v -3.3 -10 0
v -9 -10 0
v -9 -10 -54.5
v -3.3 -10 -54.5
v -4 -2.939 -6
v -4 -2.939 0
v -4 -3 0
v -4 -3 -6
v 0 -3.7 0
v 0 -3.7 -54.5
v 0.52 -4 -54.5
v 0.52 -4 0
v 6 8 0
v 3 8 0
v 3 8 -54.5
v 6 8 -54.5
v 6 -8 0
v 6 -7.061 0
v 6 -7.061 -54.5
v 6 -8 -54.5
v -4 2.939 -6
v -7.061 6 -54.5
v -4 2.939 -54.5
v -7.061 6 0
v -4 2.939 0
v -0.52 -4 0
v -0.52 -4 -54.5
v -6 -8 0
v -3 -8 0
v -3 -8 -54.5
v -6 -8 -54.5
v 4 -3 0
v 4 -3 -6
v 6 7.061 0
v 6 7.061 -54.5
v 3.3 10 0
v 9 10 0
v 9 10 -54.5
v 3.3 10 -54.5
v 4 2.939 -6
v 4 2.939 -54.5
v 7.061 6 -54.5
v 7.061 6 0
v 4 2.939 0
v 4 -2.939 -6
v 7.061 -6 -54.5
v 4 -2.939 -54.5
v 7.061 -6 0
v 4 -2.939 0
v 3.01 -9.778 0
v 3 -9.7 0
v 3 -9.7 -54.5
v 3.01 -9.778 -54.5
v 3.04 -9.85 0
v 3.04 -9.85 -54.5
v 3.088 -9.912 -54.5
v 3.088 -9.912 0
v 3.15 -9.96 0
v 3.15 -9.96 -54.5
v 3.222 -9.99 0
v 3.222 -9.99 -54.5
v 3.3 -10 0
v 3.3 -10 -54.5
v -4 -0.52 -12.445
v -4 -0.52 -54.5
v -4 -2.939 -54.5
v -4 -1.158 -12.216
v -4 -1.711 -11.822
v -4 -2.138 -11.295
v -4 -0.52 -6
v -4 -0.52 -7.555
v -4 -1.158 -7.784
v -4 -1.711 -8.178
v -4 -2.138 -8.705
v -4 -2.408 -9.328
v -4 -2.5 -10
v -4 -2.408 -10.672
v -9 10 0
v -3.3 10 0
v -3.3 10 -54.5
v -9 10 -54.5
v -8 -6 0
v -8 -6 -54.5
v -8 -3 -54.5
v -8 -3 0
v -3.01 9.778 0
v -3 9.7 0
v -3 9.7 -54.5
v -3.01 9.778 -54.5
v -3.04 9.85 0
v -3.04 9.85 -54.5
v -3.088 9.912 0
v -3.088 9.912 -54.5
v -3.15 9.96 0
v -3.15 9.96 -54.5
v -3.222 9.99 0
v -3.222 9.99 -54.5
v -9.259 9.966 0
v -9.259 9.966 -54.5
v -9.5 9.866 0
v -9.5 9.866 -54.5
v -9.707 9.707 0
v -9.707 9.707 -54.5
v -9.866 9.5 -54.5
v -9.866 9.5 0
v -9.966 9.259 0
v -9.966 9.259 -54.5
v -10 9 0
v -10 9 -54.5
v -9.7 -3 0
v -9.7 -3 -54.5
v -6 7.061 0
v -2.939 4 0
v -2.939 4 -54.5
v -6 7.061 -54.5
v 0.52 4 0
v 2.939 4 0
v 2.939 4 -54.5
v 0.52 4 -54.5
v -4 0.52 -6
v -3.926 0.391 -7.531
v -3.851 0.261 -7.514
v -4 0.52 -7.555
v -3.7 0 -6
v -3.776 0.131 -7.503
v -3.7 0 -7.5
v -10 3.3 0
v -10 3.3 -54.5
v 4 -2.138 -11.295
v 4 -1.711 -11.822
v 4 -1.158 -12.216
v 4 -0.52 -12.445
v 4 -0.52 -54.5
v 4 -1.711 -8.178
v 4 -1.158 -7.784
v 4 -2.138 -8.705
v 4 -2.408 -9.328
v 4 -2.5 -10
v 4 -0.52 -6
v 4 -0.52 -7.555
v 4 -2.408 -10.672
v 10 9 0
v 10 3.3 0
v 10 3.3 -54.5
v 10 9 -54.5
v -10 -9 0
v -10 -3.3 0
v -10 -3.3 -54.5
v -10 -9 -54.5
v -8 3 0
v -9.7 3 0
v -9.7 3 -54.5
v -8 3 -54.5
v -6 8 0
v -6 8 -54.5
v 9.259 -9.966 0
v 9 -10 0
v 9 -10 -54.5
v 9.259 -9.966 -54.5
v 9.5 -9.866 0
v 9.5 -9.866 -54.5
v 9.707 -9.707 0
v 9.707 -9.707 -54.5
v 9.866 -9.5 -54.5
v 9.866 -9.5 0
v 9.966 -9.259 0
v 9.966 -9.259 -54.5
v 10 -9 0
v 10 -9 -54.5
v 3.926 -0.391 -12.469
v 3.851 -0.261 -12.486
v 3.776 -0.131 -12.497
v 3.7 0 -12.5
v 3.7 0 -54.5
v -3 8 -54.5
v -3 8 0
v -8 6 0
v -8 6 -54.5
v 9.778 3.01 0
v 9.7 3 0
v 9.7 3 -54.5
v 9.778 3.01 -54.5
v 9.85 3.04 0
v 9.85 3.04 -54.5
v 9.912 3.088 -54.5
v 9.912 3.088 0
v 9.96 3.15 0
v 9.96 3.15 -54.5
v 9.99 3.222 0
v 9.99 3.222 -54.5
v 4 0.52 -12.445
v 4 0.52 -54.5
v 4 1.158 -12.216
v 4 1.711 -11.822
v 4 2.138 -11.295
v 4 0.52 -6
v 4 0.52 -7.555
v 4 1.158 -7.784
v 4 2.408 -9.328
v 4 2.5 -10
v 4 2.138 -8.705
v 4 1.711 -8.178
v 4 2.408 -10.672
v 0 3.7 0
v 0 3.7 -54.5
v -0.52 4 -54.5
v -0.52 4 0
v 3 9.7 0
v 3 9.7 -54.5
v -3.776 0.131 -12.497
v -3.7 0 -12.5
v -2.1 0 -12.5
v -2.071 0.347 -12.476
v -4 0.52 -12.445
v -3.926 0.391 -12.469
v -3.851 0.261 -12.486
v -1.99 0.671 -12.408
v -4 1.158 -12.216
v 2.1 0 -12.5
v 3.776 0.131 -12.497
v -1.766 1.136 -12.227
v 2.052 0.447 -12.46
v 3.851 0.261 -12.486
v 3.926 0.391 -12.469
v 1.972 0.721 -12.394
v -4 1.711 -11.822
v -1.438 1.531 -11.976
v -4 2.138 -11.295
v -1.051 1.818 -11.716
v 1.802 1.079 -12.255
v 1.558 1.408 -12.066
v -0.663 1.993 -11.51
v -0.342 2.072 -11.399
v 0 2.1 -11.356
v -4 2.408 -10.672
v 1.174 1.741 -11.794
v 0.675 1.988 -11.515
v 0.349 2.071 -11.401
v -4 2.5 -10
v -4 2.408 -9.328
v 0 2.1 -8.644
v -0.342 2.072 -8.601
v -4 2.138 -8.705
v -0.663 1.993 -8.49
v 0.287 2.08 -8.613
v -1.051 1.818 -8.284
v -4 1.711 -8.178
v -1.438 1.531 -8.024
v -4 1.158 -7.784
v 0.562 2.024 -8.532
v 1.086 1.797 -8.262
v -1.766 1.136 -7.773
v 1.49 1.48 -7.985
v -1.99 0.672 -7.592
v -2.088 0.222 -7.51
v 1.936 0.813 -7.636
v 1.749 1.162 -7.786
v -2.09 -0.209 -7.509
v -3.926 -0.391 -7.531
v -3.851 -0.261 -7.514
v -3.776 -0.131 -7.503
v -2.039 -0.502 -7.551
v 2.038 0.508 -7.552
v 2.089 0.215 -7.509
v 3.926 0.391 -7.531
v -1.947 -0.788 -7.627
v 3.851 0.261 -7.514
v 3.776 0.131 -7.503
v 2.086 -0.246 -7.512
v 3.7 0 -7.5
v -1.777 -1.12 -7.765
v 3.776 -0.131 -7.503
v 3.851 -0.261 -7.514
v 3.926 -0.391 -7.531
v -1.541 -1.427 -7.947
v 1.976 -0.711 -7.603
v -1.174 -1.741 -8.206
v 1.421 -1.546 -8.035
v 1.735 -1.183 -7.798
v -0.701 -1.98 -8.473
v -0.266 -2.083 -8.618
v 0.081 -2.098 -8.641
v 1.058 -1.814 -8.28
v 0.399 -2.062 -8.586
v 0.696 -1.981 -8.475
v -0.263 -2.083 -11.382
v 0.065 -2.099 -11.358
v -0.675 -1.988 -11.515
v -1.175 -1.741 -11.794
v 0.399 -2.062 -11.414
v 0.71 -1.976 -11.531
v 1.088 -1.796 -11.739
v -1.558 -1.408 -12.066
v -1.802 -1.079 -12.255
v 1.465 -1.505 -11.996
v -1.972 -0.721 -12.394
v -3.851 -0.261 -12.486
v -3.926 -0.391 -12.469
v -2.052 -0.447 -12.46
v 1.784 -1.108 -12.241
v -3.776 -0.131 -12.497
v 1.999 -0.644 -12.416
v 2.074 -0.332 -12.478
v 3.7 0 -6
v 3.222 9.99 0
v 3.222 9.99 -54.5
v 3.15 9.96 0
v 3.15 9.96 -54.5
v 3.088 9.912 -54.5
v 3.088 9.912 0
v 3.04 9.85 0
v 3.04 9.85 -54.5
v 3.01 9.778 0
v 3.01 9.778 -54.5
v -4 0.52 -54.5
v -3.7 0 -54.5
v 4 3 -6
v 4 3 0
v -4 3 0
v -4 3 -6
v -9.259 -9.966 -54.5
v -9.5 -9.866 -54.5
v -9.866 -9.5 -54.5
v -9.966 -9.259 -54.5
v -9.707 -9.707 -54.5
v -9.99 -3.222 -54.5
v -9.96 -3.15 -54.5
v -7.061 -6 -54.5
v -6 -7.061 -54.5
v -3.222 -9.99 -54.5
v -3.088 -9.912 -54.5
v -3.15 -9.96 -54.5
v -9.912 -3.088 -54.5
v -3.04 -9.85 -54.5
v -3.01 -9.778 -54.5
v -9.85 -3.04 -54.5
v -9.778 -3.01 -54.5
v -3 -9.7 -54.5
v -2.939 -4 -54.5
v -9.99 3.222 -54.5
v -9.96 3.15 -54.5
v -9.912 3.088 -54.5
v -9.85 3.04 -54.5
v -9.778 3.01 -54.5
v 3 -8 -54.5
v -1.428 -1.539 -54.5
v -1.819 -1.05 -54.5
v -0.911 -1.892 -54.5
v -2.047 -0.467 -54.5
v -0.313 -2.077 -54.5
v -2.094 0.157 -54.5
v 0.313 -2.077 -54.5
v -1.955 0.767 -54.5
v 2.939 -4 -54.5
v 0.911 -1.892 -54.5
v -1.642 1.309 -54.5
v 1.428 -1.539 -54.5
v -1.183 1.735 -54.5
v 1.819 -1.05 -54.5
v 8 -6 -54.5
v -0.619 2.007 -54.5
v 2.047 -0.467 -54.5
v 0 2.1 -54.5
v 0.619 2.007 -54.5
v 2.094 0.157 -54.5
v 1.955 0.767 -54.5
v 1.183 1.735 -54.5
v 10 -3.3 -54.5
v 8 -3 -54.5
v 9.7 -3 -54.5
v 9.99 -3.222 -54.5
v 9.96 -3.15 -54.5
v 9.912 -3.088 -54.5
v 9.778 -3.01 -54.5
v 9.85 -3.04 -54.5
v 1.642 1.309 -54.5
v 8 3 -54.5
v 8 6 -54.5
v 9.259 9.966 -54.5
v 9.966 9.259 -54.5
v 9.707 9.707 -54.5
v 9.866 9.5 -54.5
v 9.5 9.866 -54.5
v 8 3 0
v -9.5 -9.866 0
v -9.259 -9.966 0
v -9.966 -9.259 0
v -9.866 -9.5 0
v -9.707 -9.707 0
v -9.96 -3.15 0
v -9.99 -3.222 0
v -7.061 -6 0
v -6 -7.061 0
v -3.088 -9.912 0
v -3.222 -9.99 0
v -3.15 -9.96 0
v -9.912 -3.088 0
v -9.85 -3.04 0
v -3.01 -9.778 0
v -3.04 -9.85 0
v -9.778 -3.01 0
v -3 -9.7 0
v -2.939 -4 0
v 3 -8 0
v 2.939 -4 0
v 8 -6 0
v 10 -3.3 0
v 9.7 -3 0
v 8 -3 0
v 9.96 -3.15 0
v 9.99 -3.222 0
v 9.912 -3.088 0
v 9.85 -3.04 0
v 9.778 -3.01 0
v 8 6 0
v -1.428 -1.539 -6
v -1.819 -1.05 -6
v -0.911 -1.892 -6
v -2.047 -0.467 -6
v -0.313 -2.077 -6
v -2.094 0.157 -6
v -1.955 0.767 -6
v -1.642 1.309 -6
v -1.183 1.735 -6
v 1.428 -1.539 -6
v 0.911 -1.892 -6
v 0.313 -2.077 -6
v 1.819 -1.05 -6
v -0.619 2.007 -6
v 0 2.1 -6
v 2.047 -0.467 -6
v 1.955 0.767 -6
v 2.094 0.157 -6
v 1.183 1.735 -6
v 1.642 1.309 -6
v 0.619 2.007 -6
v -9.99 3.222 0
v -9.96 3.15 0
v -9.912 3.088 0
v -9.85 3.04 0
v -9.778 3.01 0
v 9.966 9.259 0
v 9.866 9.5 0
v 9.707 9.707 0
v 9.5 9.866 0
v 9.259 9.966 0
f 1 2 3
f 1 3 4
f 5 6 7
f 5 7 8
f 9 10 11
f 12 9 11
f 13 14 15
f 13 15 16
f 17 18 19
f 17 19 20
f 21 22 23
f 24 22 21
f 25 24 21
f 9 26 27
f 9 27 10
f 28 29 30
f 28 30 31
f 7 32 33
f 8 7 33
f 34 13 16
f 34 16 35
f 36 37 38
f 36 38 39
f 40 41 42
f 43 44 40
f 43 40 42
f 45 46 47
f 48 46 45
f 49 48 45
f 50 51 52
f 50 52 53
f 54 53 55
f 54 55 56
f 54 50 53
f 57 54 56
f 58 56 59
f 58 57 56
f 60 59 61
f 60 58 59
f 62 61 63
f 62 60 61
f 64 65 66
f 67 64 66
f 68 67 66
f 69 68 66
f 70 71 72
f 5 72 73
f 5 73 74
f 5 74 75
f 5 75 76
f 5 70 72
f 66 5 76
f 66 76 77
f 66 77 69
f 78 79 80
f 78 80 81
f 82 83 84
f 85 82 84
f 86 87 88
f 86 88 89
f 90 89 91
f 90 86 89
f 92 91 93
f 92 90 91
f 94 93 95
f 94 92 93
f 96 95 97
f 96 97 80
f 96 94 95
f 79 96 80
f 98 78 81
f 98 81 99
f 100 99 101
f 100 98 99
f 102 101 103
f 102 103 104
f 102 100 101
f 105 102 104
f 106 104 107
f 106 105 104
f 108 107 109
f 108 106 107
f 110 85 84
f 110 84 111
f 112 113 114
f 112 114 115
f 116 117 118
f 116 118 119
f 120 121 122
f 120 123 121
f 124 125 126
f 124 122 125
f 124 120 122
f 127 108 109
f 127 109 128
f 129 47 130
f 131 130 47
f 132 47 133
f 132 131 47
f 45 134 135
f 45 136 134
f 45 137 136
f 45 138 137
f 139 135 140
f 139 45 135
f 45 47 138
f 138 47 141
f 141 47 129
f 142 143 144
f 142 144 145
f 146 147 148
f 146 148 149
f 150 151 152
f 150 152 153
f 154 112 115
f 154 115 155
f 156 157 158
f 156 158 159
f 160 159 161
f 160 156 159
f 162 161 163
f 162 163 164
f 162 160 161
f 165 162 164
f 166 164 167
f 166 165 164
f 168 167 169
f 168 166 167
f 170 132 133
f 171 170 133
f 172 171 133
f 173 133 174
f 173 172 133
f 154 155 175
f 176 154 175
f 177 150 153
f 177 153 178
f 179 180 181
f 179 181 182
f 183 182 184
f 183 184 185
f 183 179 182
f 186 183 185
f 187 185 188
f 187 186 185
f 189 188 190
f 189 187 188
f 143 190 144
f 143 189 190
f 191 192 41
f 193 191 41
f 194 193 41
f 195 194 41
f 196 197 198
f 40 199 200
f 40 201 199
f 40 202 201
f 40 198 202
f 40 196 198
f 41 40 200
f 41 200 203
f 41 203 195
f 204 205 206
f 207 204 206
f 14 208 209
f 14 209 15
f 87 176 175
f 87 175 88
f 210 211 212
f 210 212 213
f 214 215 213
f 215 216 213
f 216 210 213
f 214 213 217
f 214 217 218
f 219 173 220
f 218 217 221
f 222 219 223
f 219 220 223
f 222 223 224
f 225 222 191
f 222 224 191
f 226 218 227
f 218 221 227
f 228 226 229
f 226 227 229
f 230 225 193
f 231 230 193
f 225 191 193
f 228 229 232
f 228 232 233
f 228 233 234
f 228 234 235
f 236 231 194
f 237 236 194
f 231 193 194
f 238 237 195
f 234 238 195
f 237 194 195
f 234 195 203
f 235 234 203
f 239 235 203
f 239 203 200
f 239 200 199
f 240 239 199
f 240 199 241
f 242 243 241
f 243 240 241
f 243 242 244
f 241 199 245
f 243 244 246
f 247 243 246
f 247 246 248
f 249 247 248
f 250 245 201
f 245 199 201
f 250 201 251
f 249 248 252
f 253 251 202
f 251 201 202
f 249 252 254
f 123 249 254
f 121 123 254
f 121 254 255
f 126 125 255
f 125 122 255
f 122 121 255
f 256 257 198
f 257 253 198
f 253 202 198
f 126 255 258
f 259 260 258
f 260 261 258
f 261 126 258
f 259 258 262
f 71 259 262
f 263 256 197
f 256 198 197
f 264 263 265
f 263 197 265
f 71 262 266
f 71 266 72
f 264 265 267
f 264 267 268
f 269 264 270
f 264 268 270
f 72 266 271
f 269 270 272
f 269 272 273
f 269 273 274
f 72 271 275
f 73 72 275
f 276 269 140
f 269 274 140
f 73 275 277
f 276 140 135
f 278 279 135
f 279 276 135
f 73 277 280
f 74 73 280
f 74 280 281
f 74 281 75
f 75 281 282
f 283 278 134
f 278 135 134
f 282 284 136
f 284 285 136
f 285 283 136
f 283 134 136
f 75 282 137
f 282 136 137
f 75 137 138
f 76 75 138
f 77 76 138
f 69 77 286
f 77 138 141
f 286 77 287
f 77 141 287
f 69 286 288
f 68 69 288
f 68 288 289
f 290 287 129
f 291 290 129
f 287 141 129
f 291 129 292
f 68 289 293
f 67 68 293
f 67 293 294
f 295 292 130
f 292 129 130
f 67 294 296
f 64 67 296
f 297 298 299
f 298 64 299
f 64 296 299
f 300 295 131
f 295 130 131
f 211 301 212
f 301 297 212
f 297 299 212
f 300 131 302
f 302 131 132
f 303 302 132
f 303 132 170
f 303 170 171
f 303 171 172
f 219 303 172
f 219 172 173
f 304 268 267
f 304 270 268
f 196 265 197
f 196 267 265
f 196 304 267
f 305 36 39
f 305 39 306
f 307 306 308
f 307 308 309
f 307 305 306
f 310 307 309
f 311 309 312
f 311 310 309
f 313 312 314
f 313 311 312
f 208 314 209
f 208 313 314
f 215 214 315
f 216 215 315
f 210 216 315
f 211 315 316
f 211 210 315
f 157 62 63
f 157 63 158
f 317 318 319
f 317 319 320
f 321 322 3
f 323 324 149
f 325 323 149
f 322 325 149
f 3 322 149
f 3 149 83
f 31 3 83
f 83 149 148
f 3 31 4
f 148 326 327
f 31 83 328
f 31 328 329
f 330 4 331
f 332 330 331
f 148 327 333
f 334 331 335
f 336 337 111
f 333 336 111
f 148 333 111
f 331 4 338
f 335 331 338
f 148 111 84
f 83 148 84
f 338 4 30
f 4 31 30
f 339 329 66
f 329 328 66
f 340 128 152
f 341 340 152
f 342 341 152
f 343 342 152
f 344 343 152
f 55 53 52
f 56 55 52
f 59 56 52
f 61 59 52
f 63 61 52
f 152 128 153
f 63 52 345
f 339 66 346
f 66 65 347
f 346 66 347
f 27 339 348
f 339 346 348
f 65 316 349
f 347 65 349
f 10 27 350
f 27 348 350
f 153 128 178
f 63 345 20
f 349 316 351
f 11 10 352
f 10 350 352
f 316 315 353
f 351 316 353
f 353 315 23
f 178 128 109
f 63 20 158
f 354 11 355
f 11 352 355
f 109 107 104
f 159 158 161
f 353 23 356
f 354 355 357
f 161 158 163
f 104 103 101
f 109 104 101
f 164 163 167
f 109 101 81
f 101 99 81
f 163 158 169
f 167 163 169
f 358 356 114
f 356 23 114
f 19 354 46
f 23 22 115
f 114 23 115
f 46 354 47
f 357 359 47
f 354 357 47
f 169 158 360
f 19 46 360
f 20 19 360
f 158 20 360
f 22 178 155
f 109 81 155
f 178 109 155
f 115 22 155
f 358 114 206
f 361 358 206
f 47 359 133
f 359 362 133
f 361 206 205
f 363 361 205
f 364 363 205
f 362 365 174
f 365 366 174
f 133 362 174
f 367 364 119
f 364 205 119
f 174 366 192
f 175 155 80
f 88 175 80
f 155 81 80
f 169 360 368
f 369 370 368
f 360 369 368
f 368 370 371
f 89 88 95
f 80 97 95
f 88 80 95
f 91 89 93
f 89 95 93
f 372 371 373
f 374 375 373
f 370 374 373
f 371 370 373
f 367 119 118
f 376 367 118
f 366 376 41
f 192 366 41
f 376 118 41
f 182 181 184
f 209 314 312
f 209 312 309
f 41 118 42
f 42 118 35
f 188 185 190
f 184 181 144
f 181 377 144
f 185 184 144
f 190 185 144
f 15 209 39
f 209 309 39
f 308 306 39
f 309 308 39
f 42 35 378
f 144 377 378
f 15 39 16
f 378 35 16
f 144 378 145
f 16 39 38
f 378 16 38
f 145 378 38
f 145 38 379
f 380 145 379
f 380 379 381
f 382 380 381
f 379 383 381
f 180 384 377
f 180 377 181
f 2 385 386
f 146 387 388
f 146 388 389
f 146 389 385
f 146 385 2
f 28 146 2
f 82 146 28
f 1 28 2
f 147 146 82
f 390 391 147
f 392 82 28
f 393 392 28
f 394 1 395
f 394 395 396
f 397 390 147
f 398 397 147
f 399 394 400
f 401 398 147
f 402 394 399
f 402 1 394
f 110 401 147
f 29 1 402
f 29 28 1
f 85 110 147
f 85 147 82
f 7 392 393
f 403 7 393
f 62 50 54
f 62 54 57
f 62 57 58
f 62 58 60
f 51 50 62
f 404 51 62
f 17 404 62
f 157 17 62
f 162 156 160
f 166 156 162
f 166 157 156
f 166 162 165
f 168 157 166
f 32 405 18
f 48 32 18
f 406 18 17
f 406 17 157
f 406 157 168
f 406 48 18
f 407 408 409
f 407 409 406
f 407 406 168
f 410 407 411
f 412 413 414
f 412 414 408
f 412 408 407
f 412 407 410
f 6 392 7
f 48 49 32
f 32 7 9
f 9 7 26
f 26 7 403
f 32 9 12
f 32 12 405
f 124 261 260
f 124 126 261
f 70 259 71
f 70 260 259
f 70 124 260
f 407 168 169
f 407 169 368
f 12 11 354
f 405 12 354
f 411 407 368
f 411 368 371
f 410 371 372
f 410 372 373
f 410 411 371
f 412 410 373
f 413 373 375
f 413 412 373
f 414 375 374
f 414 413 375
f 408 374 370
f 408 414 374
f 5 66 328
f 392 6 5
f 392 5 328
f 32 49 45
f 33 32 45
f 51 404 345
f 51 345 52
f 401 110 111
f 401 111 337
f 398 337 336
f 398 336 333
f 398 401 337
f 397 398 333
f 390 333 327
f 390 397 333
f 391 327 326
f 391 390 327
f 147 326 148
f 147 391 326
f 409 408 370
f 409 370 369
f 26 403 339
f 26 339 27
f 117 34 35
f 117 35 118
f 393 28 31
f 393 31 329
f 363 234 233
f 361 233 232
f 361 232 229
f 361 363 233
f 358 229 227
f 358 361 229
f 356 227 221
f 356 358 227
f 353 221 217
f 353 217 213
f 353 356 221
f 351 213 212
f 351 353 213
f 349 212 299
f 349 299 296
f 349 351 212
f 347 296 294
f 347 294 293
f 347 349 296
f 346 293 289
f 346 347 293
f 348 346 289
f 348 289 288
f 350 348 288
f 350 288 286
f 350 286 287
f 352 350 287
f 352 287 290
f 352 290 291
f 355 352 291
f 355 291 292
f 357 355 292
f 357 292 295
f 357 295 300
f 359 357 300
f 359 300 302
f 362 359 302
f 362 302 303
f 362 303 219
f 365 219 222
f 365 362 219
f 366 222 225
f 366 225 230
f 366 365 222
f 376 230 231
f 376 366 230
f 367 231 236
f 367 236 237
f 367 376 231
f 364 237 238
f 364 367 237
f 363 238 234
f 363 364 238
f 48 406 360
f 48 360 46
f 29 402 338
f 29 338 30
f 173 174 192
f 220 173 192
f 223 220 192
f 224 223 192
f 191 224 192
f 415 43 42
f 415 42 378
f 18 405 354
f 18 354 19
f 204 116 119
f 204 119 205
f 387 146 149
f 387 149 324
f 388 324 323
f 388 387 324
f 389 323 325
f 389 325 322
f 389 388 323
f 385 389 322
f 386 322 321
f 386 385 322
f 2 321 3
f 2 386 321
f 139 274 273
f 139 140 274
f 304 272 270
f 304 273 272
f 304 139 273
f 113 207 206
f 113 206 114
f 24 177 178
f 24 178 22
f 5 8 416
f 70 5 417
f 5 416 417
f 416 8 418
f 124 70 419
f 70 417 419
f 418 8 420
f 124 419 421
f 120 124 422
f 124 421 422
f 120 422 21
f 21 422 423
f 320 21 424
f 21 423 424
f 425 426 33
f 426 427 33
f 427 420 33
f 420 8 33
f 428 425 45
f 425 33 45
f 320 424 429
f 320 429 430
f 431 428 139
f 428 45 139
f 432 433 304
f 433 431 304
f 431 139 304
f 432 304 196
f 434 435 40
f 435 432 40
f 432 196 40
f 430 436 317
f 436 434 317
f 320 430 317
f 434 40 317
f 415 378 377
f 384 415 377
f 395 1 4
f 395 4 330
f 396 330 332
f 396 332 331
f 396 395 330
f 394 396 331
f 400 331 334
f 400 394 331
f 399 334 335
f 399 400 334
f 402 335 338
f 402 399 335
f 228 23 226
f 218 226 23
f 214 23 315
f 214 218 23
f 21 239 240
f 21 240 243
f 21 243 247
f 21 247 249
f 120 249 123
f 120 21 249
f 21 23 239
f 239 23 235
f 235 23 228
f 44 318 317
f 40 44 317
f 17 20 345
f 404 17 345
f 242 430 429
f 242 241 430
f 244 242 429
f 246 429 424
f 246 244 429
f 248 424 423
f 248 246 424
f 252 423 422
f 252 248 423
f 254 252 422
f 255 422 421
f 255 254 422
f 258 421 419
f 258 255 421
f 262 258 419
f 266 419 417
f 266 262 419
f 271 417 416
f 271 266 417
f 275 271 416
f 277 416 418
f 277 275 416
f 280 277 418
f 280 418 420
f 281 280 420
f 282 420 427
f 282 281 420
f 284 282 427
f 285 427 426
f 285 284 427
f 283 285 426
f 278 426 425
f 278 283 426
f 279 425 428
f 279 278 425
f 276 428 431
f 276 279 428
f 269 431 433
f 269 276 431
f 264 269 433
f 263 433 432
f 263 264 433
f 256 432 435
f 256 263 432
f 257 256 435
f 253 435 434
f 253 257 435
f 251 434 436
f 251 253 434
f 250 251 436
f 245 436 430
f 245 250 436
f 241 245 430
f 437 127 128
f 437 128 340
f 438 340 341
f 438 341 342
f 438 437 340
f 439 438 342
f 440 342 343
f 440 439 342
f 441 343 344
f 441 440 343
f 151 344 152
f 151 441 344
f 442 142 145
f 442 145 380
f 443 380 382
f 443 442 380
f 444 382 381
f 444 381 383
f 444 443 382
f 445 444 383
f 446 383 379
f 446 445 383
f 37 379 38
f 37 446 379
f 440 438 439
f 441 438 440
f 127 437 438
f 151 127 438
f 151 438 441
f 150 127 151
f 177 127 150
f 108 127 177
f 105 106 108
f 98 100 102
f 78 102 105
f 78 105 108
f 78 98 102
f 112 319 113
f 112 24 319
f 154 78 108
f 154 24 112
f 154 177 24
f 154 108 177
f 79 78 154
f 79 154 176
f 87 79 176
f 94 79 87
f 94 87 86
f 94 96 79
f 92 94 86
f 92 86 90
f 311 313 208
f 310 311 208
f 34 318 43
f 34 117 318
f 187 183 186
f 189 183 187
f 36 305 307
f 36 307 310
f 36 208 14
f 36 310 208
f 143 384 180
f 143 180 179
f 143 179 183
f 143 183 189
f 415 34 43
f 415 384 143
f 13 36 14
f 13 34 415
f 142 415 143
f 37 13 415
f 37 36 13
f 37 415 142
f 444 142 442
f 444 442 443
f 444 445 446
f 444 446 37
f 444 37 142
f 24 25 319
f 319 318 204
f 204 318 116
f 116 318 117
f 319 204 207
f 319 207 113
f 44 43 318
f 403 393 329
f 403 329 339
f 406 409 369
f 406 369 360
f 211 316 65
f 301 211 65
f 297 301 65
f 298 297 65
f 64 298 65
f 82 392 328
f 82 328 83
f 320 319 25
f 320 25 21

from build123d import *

# Parameters (mm, degrees)
BOSS_EXTRUDE1_DEPTH = 54.5
SKETCH2_W           = 54.5
SKETCH2_H           = 2.1
SKETCH4_R           = 2.5
CUT_EXTRUDE1_DEPTH  = 8
SKETCH5_W           = 6
SKETCH5_H           = 5.999987125
CUT_EXTRUDE2_DEPTH  = 8


with BuildPart() as part:
    # Sketch1 → Boss-Extrude1 (new body)
    with BuildSketch(Plane.XY):
        with BuildLine():
            Line((-10, 9), (-10, 3.29999995))
            ThreePointArc((-10, 3.29999995), (-9.912132049, 3.087867916), (-9.7, 3))
            Line((-9.7, 3), (-8, 3))
            Line((-8, 3), (-8, 6))
            Line((-8, 6), (-7.060677, 6))
            Line((-7.060677, 6), (-4, 2.93932965))
            Line((-4, 2.93932965), (-4, 0.519615242))
            Line((-4, 0.519615242), (-3.699996283, -6.437e-06))
            Line((-3.699996283, -6.437e-06), (-4, -0.519628117))
            Line((-4, -0.519628117), (-4, -2.93933725))
            Line((-4, -2.93933725), (-7.0606695, -6))
            Line((-7.0606695, -6), (-8, -6))
            Line((-8, -6), (-8, -3))
            Line((-8, -3), (-9.7, -3))
            ThreePointArc((-9.7, -3), (-9.912132049, -3.087867916), (-10, -3.29999995))
            Line((-10, -3.29999995), (-10, -9))
            ThreePointArc((-10, -9), (-9.707106781, -9.707106781), (-9, -10))
            Line((-9, -10), (-3.29999995, -10))
            ThreePointArc((-3.29999995, -10), (-3.087867916, -9.912132049), (-3, -9.7))
            Line((-3, -9.7), (-3, -8))
            Line((-3, -8), (-6, -8))
            Line((-6, -8), (-6, -7.0606515))
            Line((-6, -7.0606515), (-2.9393489, -4))
            Line((-2.9393489, -4), (-0.519615242, -4))
            Line((-0.519615242, -4), (6.437e-06, -3.699996283))
            Line((6.437e-06, -3.699996283), (0.519628117, -4))
            Line((0.519628117, -4), (2.9393227, -4))
            Line((2.9393227, -4), (6, -7.060677))
            Line((6, -7.060677), (6, -8))
            Line((6, -8), (3, -8))
            Line((3, -8), (3, -9.7))
            ThreePointArc((3, -9.7), (3.087867916, -9.912132049), (3.29999995, -10))
            Line((3.29999995, -10), (9, -10))
            ThreePointArc((9, -10), (9.707106781, -9.707106781), (10, -9))
            Line((10, -9), (10, -3.29999995))
            ThreePointArc((10, -3.29999995), (9.912132049, -3.087867916), (9.7, -3))
            Line((9.7, -3), (8, -3))
            Line((8, -3), (8, -6))
            Line((8, -6), (7.0606435, -6))
            Line((7.0606435, -6), (4, -2.9393482))
            Line((4, -2.9393482), (4, -0.519615242))
            Line((4, -0.519615242), (3.699996283, 6.437e-06))
            Line((3.699996283, 6.437e-06), (4, 0.519628117))
            Line((4, 0.519628117), (4, 2.9393401))
            Line((4, 2.9393401), (7.060651, 6))
            Line((7.060651, 6), (8, 6))
            Line((8, 6), (8, 3))
            Line((8, 3), (9.7, 3))
            ThreePointArc((9.7, 3), (9.912132049, 3.087867916), (10, 3.29999995))
            Line((10, 3.29999995), (10, 9))
            ThreePointArc((10, 9), (9.707106781, 9.707106781), (9, 10))
            Line((9, 10), (3.29999995, 10))
            ThreePointArc((3.29999995, 10), (3.087867916, 9.912132049), (3, 9.7))
            Line((3, 9.7), (3, 8))
            Line((3, 8), (6, 8))
            Line((6, 8), (6, 7.060669))
            Line((6, 7.060669), (2.9393308, 4))
            Line((2.9393308, 4), (0.519615242, 4))
            Line((0.519615242, 4), (-6.437e-06, 3.699996283))
            Line((-6.437e-06, 3.699996283), (-0.519628117, 4))
            Line((-0.519628117, 4), (-2.93935655, 4))
            Line((-2.93935655, 4), (-6, 7.0606435))
            Line((-6, 7.0606435), (-6, 8))
            Line((-6, 8), (-3, 8))
            Line((-3, 8), (-3, 9.7))
            ThreePointArc((-3, 9.7), (-3.087867966, 9.912132034), (-3.3, 10))
            Line((-3.3, 10), (-9, 10))
            ThreePointArc((-9, 10), (-9.707106781, 9.707106781), (-10, 9))
        make_face()
    extrude(amount=-BOSS_EXTRUDE1_DEPTH)

    # Sketch2 → Cut-Revolve1 (revolve, cut)
    with BuildSketch(Plane(origin=(0, 0, 0), x_dir=(0, 0, -1), z_dir=(1, 0, 0))):
        with Locations((27.25, 1.05)):
            Rectangle(SKETCH2_W, SKETCH2_H)
    revolve(axis=Axis((0, 0, -54.5), (0, 0, 1)), mode=Mode.SUBTRACT)

    # Sketch4 → Cut-Extrude1 (cut)
    with BuildSketch(Plane(origin=(4, 0, 0), x_dir=(0, 0, -1), z_dir=(1, 0, 0))):
        with Locations((10, 6.437e-06)):
            Circle(SKETCH4_R)
    extrude(amount=-CUT_EXTRUDE1_DEPTH, mode=Mode.SUBTRACT)

    # Sketch5 → Cut-Extrude2 (cut)
    with BuildSketch(Plane(origin=(4, 0, 0), x_dir=(0, 0, -1), z_dir=(1, 0, 0))):
        with Locations((3, 6.437e-06)):
            Rectangle(SKETCH5_W, SKETCH5_H)
    extrude(amount=-CUT_EXTRUDE2_DEPTH, mode=Mode.SUBTRACT)


solid = part.part
